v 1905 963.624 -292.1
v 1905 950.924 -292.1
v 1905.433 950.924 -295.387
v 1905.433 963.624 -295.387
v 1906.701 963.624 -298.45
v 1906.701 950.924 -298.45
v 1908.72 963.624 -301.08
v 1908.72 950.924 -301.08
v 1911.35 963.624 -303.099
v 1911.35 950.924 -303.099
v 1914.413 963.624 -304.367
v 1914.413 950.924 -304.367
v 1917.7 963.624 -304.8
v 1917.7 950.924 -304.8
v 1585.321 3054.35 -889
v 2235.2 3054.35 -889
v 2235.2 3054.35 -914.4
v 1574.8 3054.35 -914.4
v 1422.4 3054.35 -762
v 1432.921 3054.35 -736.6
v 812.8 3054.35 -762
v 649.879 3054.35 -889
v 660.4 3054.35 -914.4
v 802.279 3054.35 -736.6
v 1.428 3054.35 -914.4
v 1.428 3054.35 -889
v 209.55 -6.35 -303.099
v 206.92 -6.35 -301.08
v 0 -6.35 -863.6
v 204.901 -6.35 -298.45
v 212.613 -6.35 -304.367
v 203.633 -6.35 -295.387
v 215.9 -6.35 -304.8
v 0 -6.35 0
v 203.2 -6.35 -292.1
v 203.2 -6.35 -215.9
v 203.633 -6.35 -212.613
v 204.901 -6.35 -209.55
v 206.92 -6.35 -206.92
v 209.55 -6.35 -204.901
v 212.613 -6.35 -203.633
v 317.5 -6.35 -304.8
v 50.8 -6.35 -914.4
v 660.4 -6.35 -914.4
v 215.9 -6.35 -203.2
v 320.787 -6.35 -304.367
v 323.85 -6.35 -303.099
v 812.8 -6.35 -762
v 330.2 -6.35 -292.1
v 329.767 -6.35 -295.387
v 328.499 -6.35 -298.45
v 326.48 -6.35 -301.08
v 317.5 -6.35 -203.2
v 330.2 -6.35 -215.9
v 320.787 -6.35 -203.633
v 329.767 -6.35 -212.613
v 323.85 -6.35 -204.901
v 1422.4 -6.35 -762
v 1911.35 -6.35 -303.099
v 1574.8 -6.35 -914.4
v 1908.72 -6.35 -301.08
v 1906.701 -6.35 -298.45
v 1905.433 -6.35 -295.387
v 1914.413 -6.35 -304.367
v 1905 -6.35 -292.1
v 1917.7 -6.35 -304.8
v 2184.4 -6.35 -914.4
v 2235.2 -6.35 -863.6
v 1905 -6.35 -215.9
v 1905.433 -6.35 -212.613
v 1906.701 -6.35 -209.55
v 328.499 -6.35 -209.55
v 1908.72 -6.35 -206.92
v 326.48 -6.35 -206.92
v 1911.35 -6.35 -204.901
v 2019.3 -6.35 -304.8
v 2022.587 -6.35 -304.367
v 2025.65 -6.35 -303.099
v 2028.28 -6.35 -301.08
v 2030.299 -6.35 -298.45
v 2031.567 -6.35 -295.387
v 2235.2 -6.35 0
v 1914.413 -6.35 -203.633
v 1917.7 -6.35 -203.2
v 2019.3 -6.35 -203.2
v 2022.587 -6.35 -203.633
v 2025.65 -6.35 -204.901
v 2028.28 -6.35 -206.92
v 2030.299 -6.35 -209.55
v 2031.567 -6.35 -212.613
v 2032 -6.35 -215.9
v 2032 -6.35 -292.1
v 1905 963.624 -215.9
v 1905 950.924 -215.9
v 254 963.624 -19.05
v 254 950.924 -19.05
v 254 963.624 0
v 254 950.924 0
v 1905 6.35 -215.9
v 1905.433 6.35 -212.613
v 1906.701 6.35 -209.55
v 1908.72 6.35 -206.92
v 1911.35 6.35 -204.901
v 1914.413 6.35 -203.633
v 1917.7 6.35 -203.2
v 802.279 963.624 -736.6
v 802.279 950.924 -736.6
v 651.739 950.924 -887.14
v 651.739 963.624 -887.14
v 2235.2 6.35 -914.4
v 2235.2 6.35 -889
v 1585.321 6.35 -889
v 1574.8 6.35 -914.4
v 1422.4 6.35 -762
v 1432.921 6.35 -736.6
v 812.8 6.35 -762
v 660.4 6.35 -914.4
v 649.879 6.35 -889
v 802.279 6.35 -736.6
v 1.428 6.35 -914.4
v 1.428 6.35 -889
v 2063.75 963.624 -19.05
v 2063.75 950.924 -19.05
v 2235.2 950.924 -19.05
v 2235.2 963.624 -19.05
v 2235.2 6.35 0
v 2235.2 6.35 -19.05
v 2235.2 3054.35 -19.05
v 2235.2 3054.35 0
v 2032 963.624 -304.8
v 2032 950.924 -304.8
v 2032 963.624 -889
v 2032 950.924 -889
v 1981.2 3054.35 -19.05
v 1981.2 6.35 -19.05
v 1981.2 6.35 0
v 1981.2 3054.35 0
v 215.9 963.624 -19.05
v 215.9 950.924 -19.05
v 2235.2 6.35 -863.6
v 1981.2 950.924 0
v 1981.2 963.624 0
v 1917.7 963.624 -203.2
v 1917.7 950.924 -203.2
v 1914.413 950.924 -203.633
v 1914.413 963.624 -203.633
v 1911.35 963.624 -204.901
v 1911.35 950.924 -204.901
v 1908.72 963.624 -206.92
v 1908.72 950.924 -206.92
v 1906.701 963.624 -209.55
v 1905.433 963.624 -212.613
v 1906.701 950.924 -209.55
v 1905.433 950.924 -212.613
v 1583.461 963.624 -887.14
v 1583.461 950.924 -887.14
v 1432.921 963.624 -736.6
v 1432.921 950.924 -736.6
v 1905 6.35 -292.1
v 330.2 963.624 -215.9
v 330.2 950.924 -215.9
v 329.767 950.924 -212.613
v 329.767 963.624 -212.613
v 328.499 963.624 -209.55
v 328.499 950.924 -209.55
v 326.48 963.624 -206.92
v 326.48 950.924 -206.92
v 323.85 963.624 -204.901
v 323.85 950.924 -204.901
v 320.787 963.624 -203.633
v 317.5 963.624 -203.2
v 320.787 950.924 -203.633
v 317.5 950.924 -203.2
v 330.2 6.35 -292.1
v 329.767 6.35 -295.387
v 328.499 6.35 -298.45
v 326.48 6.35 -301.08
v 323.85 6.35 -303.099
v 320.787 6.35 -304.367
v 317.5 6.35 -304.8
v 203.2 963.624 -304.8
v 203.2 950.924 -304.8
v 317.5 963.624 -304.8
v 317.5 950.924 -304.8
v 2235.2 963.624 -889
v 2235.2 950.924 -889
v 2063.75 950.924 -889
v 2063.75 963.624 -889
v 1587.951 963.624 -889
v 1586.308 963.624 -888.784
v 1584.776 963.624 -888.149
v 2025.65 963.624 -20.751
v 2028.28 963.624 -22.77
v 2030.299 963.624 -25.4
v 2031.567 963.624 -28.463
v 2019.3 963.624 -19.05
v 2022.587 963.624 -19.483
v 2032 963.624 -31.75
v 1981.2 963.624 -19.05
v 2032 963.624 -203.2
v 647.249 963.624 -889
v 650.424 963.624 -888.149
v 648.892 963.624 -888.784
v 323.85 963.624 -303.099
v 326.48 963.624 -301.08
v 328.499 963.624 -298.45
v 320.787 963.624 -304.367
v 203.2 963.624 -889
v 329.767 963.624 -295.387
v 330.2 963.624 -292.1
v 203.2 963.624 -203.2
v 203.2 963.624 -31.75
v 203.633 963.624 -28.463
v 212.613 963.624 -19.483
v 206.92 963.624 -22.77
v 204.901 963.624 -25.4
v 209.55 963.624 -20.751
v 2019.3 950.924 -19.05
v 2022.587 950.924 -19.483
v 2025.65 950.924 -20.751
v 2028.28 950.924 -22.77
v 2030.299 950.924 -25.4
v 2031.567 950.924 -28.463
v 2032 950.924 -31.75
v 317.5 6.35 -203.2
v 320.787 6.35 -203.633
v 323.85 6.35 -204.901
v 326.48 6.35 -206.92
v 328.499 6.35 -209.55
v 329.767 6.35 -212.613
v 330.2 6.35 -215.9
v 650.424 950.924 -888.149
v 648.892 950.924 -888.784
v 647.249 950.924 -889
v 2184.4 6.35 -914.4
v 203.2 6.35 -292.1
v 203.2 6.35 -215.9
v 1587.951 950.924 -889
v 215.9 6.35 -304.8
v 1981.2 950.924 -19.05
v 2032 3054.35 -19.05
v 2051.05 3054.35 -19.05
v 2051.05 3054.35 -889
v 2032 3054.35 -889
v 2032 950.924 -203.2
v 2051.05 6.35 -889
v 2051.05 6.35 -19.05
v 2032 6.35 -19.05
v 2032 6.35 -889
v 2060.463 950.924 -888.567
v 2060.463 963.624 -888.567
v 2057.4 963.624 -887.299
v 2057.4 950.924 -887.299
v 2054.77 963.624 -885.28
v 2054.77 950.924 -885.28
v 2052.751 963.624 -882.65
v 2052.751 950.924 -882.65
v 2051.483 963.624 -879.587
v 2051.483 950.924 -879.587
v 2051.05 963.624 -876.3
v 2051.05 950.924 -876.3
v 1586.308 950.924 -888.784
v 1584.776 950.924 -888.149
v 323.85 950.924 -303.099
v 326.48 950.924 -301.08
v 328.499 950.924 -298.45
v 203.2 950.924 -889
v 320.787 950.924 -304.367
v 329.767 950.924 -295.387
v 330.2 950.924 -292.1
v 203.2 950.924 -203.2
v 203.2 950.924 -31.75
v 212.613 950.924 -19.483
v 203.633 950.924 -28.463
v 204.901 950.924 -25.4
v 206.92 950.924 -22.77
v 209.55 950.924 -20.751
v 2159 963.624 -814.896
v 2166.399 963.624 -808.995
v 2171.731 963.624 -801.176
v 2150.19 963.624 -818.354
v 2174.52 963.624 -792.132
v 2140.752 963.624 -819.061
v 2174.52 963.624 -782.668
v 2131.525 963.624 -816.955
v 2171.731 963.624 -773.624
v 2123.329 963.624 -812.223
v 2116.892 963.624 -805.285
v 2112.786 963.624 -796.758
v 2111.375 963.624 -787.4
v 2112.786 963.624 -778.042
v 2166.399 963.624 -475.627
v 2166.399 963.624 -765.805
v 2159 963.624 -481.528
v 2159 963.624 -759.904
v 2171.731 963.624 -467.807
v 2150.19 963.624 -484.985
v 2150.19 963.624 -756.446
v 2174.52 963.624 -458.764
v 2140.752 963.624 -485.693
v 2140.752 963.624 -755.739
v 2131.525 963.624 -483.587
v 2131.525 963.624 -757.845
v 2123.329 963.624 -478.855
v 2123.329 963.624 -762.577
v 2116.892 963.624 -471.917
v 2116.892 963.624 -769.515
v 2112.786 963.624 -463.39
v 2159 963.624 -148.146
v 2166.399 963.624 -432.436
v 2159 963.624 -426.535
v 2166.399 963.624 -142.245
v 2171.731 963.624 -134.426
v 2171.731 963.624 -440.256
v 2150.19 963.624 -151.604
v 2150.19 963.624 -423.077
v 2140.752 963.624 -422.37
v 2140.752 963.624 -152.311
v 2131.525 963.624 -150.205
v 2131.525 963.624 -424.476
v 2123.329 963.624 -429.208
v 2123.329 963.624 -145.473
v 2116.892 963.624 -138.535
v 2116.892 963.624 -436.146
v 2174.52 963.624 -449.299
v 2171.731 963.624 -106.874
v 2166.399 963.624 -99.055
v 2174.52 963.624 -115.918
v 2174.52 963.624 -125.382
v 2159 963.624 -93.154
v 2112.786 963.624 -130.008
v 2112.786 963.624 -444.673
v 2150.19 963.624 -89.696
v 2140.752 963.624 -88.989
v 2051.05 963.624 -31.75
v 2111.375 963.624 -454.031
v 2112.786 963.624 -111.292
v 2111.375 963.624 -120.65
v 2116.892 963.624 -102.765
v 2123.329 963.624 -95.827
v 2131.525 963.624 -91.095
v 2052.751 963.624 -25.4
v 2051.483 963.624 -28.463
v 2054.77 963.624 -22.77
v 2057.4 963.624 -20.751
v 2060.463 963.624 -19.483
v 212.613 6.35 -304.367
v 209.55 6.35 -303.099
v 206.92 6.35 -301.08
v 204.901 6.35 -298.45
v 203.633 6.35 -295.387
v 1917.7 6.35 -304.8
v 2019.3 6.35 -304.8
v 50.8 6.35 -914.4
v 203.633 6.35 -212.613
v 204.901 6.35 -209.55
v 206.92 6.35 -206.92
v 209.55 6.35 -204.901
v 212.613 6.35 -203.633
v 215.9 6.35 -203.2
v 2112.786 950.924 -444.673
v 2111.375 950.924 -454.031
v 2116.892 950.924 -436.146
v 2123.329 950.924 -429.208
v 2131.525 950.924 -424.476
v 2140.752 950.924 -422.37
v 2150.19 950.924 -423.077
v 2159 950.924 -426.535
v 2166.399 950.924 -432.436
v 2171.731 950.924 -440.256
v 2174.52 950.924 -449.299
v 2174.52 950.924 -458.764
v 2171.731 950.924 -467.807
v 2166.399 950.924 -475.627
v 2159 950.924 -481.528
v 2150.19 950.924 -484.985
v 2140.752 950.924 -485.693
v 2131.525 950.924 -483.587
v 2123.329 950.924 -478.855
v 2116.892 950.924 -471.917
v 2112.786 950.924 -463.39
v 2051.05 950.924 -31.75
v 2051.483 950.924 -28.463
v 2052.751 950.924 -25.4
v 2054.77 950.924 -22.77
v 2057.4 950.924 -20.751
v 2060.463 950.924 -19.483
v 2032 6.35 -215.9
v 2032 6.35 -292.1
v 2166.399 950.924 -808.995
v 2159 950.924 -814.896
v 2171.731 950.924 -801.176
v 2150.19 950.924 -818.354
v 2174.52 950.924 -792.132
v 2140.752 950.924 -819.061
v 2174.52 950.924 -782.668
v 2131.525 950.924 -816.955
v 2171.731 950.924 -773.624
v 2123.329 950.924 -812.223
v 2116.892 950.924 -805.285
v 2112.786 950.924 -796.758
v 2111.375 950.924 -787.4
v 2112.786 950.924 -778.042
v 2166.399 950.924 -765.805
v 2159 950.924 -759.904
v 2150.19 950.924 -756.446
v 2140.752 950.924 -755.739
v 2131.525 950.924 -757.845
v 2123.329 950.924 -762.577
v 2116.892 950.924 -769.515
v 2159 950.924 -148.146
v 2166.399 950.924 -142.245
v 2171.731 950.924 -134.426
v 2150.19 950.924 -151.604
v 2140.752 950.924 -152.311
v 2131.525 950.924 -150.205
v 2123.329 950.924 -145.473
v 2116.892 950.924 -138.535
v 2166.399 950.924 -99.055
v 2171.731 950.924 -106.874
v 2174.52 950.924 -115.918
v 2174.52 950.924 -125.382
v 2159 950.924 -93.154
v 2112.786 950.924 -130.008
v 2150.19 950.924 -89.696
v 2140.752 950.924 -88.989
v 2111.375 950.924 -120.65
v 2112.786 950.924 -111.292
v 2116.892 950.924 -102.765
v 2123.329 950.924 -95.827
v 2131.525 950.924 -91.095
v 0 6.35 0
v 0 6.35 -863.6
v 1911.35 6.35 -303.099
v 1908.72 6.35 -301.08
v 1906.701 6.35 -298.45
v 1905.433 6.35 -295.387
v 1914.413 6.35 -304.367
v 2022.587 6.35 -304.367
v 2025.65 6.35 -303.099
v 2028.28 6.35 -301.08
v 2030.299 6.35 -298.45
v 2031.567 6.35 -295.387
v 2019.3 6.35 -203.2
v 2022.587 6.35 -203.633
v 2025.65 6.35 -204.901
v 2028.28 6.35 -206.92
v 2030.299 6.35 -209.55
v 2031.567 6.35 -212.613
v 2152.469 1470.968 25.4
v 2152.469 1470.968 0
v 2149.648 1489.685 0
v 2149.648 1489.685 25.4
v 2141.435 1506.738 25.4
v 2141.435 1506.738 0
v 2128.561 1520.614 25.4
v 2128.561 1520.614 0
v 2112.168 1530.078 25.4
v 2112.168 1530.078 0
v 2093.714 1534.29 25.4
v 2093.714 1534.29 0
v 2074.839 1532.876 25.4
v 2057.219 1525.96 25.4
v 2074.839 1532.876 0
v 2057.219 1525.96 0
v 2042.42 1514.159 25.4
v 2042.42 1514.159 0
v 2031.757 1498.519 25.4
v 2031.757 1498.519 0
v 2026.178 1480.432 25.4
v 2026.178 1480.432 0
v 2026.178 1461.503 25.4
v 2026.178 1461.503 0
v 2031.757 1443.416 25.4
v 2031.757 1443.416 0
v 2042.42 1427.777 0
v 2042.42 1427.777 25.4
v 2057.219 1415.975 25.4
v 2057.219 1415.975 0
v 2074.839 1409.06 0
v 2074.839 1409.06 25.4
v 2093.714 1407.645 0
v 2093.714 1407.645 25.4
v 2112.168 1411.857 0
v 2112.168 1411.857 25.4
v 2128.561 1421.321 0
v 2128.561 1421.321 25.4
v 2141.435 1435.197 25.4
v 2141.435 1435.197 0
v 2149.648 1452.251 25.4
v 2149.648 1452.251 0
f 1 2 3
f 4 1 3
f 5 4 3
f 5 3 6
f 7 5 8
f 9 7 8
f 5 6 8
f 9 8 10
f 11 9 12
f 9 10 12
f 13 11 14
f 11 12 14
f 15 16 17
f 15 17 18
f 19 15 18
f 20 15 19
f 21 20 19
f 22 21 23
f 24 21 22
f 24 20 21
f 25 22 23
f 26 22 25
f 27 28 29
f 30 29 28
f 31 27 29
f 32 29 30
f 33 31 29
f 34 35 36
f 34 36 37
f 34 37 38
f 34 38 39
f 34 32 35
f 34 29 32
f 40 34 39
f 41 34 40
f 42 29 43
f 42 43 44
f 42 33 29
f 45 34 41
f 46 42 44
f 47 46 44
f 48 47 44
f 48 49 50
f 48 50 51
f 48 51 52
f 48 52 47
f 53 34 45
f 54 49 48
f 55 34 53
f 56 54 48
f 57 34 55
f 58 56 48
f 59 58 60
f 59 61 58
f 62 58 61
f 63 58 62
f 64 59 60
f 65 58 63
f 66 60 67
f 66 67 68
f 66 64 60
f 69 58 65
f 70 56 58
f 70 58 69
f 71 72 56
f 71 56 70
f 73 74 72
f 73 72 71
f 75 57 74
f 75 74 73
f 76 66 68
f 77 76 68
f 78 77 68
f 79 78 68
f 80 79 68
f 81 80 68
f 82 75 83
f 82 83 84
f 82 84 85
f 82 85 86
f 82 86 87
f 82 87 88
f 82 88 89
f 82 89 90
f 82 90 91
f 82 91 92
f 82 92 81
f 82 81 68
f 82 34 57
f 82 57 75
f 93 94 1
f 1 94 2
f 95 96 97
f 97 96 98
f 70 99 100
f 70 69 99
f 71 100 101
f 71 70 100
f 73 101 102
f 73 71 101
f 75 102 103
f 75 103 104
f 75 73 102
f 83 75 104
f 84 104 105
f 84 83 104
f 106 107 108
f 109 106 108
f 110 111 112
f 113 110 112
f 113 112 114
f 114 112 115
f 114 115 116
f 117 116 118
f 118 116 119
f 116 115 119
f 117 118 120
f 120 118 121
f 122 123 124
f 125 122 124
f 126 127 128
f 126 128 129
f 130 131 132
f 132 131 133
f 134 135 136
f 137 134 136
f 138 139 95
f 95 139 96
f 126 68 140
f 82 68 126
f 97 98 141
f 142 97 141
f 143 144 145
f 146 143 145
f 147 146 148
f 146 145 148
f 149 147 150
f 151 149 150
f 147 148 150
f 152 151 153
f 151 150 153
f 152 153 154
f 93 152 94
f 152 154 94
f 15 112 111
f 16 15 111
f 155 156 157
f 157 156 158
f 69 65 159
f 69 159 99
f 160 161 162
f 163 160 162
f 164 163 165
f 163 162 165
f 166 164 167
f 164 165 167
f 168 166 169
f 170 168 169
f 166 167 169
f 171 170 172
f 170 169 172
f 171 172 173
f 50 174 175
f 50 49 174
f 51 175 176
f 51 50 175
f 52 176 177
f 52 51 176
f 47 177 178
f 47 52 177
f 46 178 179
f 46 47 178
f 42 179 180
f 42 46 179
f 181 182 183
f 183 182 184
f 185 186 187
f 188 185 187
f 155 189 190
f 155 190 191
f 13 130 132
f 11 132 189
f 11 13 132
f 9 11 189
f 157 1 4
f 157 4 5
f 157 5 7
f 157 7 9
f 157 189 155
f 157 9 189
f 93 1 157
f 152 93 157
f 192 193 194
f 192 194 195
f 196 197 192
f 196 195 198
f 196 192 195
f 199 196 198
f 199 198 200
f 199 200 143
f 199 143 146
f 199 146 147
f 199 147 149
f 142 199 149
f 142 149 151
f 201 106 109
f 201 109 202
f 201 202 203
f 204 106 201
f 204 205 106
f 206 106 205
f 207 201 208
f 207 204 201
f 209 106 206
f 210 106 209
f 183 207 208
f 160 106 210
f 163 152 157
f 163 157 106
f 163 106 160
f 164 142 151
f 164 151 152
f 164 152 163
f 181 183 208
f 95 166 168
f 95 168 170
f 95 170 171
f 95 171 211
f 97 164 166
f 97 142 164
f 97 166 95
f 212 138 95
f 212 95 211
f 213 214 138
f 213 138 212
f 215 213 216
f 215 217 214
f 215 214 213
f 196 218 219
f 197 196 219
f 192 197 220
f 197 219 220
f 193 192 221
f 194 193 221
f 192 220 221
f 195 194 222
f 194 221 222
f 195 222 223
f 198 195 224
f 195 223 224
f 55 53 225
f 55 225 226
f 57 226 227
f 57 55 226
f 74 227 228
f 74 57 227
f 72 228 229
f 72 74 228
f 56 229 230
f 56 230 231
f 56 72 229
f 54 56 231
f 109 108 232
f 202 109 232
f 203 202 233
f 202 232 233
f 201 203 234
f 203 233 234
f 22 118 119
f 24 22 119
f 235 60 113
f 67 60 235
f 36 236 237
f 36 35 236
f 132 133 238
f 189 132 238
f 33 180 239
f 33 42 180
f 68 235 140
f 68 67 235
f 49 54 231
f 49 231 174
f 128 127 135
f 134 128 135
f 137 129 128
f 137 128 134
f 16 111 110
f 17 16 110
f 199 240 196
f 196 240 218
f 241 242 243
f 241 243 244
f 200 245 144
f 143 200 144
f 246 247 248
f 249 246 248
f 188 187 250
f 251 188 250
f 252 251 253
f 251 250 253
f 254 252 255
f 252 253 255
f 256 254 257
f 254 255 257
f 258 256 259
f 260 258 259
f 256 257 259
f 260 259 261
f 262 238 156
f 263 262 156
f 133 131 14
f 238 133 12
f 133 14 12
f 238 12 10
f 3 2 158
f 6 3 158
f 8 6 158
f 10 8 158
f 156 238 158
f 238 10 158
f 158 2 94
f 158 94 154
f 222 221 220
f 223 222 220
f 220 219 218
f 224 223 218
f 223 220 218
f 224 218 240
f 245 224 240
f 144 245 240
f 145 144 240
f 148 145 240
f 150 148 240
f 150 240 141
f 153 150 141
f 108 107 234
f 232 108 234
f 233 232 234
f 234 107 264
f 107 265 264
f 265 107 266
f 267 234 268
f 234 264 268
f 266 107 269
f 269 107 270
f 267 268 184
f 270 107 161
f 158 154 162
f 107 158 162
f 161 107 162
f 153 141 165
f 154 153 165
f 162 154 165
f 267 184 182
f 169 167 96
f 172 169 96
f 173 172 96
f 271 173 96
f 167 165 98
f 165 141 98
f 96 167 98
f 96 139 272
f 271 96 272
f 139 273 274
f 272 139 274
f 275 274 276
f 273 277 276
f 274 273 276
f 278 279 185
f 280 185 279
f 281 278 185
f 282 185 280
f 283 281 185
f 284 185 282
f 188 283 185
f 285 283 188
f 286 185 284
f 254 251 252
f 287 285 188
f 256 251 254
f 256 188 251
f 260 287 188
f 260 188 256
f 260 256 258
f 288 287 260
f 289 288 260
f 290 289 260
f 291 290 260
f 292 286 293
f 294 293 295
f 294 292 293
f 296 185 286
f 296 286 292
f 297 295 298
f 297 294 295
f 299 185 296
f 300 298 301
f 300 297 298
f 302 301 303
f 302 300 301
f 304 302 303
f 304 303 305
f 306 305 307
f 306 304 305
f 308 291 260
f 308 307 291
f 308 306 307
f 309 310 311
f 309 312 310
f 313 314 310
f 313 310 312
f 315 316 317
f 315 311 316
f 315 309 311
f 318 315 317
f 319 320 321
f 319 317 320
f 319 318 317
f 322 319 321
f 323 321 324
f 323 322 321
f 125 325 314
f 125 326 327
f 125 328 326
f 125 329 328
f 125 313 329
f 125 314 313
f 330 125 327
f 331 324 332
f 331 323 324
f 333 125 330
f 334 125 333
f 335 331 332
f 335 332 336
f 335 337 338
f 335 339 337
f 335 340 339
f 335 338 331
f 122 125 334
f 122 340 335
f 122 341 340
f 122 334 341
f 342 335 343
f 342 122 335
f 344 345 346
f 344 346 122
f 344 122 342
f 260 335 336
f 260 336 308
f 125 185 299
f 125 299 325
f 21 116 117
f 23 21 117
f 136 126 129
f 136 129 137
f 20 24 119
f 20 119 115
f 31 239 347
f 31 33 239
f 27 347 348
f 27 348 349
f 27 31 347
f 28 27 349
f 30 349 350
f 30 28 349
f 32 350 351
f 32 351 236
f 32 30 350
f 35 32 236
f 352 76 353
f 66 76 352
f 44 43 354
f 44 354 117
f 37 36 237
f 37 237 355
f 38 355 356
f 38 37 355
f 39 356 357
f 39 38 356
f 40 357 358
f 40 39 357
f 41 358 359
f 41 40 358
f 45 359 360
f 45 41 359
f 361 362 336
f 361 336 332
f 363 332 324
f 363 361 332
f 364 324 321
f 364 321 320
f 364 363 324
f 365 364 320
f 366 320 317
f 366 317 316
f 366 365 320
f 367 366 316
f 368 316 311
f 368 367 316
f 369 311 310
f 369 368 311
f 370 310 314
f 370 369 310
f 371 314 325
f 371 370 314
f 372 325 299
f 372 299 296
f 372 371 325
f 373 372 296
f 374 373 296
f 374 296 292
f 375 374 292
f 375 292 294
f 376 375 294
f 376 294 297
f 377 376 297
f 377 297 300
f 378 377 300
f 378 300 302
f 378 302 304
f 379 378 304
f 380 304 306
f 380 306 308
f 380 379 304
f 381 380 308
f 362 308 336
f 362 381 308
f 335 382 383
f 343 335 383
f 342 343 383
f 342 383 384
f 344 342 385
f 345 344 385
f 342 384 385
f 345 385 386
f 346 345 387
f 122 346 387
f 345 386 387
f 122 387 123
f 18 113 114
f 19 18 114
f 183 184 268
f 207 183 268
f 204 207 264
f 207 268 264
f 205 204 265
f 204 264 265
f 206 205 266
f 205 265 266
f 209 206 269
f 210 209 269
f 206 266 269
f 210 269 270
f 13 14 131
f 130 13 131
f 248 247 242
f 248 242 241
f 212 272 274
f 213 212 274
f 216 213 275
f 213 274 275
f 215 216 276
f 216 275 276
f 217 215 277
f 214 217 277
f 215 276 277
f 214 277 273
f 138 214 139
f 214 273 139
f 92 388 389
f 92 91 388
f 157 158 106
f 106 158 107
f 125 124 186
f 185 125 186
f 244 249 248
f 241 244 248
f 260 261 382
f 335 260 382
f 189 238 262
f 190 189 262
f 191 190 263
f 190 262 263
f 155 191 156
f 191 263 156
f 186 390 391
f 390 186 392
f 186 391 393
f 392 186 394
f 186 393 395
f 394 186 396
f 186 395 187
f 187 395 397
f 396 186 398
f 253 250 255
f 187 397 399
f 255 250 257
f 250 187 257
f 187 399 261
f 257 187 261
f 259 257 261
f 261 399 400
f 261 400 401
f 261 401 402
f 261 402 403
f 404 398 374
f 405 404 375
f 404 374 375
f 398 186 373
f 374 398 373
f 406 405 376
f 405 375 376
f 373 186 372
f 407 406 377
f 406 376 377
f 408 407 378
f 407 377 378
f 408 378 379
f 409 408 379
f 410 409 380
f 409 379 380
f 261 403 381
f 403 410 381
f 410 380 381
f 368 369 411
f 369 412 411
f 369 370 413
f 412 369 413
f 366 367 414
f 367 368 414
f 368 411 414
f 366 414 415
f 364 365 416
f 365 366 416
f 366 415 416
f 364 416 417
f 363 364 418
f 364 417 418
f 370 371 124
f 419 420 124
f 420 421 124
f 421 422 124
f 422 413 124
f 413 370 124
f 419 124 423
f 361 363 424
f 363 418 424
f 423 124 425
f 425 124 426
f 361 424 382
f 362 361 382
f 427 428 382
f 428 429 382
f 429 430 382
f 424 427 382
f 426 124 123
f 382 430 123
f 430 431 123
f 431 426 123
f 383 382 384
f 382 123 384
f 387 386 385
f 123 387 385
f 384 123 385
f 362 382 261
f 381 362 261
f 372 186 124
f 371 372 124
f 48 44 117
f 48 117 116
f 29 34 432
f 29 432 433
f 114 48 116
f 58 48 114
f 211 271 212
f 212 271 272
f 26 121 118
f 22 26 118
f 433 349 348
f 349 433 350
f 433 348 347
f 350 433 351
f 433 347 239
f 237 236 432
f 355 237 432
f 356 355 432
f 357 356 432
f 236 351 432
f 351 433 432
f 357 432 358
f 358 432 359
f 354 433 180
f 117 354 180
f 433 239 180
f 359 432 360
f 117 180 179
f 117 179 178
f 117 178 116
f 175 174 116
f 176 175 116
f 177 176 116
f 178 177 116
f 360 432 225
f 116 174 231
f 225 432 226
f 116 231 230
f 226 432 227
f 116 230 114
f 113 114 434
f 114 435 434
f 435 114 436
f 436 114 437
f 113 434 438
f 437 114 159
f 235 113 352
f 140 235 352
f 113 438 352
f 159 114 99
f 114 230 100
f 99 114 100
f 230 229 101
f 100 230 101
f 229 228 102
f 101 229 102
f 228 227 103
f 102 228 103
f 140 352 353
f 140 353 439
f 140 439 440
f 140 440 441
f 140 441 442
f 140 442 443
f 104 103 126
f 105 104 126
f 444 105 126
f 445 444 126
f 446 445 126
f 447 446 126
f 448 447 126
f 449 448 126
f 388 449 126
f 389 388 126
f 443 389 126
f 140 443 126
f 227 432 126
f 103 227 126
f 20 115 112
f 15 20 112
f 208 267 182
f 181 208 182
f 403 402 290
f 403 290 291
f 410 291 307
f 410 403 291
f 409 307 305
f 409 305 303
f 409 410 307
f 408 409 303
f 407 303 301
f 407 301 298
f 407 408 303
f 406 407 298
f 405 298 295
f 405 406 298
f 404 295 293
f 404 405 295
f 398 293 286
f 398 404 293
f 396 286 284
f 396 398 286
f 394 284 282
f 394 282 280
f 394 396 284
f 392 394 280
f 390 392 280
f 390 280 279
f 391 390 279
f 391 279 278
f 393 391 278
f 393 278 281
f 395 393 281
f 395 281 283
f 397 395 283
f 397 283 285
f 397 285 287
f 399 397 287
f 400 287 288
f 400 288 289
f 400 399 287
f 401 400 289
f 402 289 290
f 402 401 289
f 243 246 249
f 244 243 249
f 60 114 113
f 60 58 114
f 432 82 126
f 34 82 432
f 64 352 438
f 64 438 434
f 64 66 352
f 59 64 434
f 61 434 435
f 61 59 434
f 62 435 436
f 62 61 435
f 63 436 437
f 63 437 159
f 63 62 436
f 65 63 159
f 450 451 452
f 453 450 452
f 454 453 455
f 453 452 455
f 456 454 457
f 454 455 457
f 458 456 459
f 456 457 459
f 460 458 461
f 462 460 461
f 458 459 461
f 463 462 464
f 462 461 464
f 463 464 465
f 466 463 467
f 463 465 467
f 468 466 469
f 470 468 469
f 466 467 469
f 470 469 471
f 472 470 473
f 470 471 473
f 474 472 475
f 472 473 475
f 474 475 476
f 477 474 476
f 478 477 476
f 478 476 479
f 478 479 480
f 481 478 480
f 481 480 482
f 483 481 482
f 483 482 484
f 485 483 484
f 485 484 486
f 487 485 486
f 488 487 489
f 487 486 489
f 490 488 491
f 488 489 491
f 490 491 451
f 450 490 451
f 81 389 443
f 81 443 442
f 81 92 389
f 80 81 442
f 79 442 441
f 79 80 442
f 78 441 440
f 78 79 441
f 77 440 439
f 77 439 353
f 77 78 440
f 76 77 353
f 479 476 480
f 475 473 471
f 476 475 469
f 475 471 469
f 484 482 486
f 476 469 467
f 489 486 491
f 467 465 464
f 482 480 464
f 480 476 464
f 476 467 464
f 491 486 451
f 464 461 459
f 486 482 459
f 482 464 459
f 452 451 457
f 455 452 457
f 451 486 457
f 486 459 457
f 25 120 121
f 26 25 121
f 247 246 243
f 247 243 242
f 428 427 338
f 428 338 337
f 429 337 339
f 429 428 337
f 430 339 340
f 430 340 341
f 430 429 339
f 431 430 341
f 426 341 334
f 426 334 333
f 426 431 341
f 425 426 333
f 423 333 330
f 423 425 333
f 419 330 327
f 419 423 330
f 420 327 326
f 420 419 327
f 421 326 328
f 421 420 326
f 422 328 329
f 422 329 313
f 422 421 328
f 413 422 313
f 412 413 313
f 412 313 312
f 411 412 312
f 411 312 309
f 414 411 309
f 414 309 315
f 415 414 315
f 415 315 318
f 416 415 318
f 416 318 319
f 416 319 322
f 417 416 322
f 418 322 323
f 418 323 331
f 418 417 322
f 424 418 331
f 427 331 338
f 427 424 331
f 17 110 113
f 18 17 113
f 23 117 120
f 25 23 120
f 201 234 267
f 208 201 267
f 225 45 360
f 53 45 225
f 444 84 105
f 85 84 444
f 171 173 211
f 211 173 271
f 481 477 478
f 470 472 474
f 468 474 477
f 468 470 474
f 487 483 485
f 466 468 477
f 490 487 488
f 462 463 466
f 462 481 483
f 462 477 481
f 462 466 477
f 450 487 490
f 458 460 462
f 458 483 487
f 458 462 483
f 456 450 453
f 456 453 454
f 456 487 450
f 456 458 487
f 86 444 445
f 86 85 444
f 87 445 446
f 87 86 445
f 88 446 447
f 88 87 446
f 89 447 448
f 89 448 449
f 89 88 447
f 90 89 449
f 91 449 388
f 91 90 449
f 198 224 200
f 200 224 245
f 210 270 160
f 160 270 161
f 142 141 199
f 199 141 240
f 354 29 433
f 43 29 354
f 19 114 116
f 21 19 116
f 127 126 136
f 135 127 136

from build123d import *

# Parameters (mm, degrees)
F1_DEPTH  = 6.35
F2_W      = 254
F2_H      = 19.05
F3_DEPTH  = 3048
F5_DEPTH  = 3048
F6_W      = 19.05
F6_H      = 869.95
F7_DEPTH  = 3048
F10_DEPTH = 12.7
F11_R     = 31.75
F12_DEPTH = 12.7
F13_R     = 63.5
F14_DEPTH = 25.4


with BuildPart() as f1:
    # F0 (on Front) → F1 (new body, symmetric)
    with BuildSketch(Plane.XZ):
        Polygon((2235.2, 0), (0, 0), (0, -863.6), (50.8, -914.4), (660.4, -914.4), (812.8, -762), (1422.4, -762), (1574.8, -914.4), (2184.4, -914.4), (2235.2, -863.6), align=None)
        with BuildLine():
            ThreePointArc((203.2, -215.9), (206.9197438789, -206.9197438789), (215.9, -203.2))
            Line((215.9, -203.2), (317.5, -203.2))
            ThreePointArc((317.5, -203.2), (326.4802561211, -206.9197438789), (330.2, -215.9))
            Line((330.2, -215.9), (330.2, -292.1))
            ThreePointArc((330.2, -292.1), (326.4802561211, -301.0802561211), (317.5, -304.8))
            Line((317.5, -304.8), (215.9, -304.8))
            ThreePointArc((215.9, -304.8), (206.9197438789, -301.0802561211), (203.2, -292.1))
            Line((203.2, -292.1), (203.2, -215.9))
        make_face(mode=Mode.SUBTRACT)
        with BuildLine():
            Line((1905, -292.1), (1905, -215.9))
            ThreePointArc((1905, -215.9), (1908.7197438789, -206.9197438789), (1917.7, -203.2))
            Line((1917.7, -203.2), (2019.3, -203.2))
            ThreePointArc((2019.3, -203.2), (2028.2802561211, -206.9197438789), (2032, -215.9))
            Line((2032, -215.9), (2032, -292.1))
            ThreePointArc((2032, -292.1), (2028.2802561211, -301.0802561211), (2019.3, -304.8))
            Line((2019.3, -304.8), (1917.7, -304.8))
            ThreePointArc((1917.7, -304.8), (1908.7197438789, -301.0802561211), (1905, -292.1))
        make_face(mode=Mode.SUBTRACT)
    extrude(amount=F1_DEPTH, both=True)


with BuildPart() as f3:
    # F2 (on face) → F3 (new body)
    with BuildSketch(Plane(origin=(0, 6.35, 0), x_dir=(-1, 0, 0), z_dir=(0, 1, 0))):
        with Locations((-2108.2, -9.525)):
            Rectangle(F2_W, F2_H)
    extrude(amount=F3_DEPTH)


with BuildPart() as f5:
    # F4 (on face) → F5 (new body)
    with BuildSketch(Plane(origin=(0, 6.35, 0), x_dir=(-1, 0, 0), z_dir=(0, 1, 0))):
        Polygon((-2235.2, -889), (-2235.2, -914.4), (-1574.8, -914.4), (-1422.4, -762), (-812.8, -762), (-660.4, -914.4), (-1.4282464981, -914.4), (-1.4282464981, -889), (-649.8789755157, -889), (-802.2789755157, -736.6), (-1432.9210244843, -736.6), (-1585.3210244843, -889), align=None)
    extrude(amount=F5_DEPTH)


with BuildPart() as f7:
    # F6 (on face) → F7 (new body)
    with BuildSketch(Plane(origin=(0, 6.35, 0), x_dir=(-1, 0, 0), z_dir=(0, 1, 0))):
        with Locations((-2041.525, -454.025)):
            Rectangle(F6_W, F6_H)
    extrude(amount=F7_DEPTH)


with BuildPart() as f10:
    # F9 (on offset) → F10 (new body)
    with BuildSketch(Plane(origin=(0, 950.9242908865, 0), x_dir=(-1, 0, 0), z_dir=(0, 1, 0))):
        with BuildLine():
            Line((-2032, -304.8), (-2032, -889))
            Line((-2032, -889), (-1587.9512806053, -889))
            ThreePointArc((-1587.9512806053, -889), (-1585.5212408098, -888.5166350314), (-1583.4611525448, -887.1401280605))
            Line((-1583.4611525448, -887.1401280605), (-1432.9210244843, -736.6))
            Line((-1432.9210244843, -736.6), (-802.2789755157, -736.6))
            Line((-802.2789755157, -736.6), (-651.7388474552, -887.1401280605))
            ThreePointArc((-651.7388474552, -887.1401280605), (-649.6787591902, -888.5166350314), (-647.2487193947, -889))
            Line((-647.2487193947, -889), (-203.2, -889))
            Line((-203.2, -889), (-203.2, -304.8))
            Line((-203.2, -304.8), (-317.5, -304.8))
            ThreePointArc((-317.5, -304.8), (-326.4802561211, -301.0802561211), (-330.2, -292.1))
            Line((-330.2, -292.1), (-330.2, -215.9))
            ThreePointArc((-330.2, -215.9), (-326.4802561211, -206.9197438789), (-317.5, -203.2))
            Line((-317.5, -203.2), (-203.2, -203.2))
            Line((-203.2, -203.2), (-203.2, -31.75))
            ThreePointArc((-203.2, -31.75), (-206.9197438789, -22.7697438789), (-215.9, -19.05))
            Line((-215.9, -19.05), (-254, -19.05))
            Line((-254, -19.05), (-254, 0))
            Line((-254, 0), (-1981.2, 0))
            Line((-1981.2, 0), (-1981.2, -19.05))
            Line((-1981.2, -19.05), (-2019.3, -19.05))
            ThreePointArc((-2019.3, -19.05), (-2028.2802561211, -22.7697438789), (-2032, -31.75))
            Line((-2032, -31.75), (-2032, -203.2))
            Line((-2032, -203.2), (-1917.7, -203.2))
            ThreePointArc((-1917.7, -203.2), (-1908.7197438789, -206.9197438789), (-1905, -215.9))
            Line((-1905, -215.9), (-1905, -292.1))
            ThreePointArc((-1905, -292.1), (-1908.7197438789, -301.0802561211), (-1917.7, -304.8))
            Line((-1917.7, -304.8), (-2032, -304.8))
        make_face()
    extrude(amount=F10_DEPTH)


with BuildPart() as f12:
    # F11 (on offset) → F12 (new body)
    with BuildSketch(Plane(origin=(0, 950.9242908865, 0), x_dir=(-1, 0, 0), z_dir=(0, 1, 0))):
        with BuildLine():
            Line((-2051.05, -876.3), (-2051.05, -31.75))
            ThreePointArc((-2051.05, -31.75), (-2054.7697438789, -22.7697438789), (-2063.75, -19.05))
            Line((-2063.75, -19.05), (-2235.2, -19.05))
            Line((-2235.2, -19.05), (-2235.2, -889))
            Line((-2235.2, -889), (-2063.75, -889))
            ThreePointArc((-2063.75, -889), (-2054.7697438789, -885.2802561211), (-2051.05, -876.3))
        make_face()
        with Locations((-2143.125, -787.4)):
            Circle(F11_R, mode=Mode.SUBTRACT)
        with Locations((-2143.125, -454.0314514875)):
            Circle(F11_R, mode=Mode.SUBTRACT)
        with Locations((-2143.125, -120.65)):
            Circle(F11_R, mode=Mode.SUBTRACT)
    extrude(amount=F12_DEPTH)


with BuildPart() as f14:
    # F13 (on face) → F14 (new body)
    with BuildSketch(Plane.XY):
        with Locations((2088.9689922333, 1470.9676504135)):
            Circle(F13_R)
    extrude(amount=F14_DEPTH)


solid = Compound([f1.part, f3.part, f5.part, f7.part, f10.part, f12.part, f14.part])
